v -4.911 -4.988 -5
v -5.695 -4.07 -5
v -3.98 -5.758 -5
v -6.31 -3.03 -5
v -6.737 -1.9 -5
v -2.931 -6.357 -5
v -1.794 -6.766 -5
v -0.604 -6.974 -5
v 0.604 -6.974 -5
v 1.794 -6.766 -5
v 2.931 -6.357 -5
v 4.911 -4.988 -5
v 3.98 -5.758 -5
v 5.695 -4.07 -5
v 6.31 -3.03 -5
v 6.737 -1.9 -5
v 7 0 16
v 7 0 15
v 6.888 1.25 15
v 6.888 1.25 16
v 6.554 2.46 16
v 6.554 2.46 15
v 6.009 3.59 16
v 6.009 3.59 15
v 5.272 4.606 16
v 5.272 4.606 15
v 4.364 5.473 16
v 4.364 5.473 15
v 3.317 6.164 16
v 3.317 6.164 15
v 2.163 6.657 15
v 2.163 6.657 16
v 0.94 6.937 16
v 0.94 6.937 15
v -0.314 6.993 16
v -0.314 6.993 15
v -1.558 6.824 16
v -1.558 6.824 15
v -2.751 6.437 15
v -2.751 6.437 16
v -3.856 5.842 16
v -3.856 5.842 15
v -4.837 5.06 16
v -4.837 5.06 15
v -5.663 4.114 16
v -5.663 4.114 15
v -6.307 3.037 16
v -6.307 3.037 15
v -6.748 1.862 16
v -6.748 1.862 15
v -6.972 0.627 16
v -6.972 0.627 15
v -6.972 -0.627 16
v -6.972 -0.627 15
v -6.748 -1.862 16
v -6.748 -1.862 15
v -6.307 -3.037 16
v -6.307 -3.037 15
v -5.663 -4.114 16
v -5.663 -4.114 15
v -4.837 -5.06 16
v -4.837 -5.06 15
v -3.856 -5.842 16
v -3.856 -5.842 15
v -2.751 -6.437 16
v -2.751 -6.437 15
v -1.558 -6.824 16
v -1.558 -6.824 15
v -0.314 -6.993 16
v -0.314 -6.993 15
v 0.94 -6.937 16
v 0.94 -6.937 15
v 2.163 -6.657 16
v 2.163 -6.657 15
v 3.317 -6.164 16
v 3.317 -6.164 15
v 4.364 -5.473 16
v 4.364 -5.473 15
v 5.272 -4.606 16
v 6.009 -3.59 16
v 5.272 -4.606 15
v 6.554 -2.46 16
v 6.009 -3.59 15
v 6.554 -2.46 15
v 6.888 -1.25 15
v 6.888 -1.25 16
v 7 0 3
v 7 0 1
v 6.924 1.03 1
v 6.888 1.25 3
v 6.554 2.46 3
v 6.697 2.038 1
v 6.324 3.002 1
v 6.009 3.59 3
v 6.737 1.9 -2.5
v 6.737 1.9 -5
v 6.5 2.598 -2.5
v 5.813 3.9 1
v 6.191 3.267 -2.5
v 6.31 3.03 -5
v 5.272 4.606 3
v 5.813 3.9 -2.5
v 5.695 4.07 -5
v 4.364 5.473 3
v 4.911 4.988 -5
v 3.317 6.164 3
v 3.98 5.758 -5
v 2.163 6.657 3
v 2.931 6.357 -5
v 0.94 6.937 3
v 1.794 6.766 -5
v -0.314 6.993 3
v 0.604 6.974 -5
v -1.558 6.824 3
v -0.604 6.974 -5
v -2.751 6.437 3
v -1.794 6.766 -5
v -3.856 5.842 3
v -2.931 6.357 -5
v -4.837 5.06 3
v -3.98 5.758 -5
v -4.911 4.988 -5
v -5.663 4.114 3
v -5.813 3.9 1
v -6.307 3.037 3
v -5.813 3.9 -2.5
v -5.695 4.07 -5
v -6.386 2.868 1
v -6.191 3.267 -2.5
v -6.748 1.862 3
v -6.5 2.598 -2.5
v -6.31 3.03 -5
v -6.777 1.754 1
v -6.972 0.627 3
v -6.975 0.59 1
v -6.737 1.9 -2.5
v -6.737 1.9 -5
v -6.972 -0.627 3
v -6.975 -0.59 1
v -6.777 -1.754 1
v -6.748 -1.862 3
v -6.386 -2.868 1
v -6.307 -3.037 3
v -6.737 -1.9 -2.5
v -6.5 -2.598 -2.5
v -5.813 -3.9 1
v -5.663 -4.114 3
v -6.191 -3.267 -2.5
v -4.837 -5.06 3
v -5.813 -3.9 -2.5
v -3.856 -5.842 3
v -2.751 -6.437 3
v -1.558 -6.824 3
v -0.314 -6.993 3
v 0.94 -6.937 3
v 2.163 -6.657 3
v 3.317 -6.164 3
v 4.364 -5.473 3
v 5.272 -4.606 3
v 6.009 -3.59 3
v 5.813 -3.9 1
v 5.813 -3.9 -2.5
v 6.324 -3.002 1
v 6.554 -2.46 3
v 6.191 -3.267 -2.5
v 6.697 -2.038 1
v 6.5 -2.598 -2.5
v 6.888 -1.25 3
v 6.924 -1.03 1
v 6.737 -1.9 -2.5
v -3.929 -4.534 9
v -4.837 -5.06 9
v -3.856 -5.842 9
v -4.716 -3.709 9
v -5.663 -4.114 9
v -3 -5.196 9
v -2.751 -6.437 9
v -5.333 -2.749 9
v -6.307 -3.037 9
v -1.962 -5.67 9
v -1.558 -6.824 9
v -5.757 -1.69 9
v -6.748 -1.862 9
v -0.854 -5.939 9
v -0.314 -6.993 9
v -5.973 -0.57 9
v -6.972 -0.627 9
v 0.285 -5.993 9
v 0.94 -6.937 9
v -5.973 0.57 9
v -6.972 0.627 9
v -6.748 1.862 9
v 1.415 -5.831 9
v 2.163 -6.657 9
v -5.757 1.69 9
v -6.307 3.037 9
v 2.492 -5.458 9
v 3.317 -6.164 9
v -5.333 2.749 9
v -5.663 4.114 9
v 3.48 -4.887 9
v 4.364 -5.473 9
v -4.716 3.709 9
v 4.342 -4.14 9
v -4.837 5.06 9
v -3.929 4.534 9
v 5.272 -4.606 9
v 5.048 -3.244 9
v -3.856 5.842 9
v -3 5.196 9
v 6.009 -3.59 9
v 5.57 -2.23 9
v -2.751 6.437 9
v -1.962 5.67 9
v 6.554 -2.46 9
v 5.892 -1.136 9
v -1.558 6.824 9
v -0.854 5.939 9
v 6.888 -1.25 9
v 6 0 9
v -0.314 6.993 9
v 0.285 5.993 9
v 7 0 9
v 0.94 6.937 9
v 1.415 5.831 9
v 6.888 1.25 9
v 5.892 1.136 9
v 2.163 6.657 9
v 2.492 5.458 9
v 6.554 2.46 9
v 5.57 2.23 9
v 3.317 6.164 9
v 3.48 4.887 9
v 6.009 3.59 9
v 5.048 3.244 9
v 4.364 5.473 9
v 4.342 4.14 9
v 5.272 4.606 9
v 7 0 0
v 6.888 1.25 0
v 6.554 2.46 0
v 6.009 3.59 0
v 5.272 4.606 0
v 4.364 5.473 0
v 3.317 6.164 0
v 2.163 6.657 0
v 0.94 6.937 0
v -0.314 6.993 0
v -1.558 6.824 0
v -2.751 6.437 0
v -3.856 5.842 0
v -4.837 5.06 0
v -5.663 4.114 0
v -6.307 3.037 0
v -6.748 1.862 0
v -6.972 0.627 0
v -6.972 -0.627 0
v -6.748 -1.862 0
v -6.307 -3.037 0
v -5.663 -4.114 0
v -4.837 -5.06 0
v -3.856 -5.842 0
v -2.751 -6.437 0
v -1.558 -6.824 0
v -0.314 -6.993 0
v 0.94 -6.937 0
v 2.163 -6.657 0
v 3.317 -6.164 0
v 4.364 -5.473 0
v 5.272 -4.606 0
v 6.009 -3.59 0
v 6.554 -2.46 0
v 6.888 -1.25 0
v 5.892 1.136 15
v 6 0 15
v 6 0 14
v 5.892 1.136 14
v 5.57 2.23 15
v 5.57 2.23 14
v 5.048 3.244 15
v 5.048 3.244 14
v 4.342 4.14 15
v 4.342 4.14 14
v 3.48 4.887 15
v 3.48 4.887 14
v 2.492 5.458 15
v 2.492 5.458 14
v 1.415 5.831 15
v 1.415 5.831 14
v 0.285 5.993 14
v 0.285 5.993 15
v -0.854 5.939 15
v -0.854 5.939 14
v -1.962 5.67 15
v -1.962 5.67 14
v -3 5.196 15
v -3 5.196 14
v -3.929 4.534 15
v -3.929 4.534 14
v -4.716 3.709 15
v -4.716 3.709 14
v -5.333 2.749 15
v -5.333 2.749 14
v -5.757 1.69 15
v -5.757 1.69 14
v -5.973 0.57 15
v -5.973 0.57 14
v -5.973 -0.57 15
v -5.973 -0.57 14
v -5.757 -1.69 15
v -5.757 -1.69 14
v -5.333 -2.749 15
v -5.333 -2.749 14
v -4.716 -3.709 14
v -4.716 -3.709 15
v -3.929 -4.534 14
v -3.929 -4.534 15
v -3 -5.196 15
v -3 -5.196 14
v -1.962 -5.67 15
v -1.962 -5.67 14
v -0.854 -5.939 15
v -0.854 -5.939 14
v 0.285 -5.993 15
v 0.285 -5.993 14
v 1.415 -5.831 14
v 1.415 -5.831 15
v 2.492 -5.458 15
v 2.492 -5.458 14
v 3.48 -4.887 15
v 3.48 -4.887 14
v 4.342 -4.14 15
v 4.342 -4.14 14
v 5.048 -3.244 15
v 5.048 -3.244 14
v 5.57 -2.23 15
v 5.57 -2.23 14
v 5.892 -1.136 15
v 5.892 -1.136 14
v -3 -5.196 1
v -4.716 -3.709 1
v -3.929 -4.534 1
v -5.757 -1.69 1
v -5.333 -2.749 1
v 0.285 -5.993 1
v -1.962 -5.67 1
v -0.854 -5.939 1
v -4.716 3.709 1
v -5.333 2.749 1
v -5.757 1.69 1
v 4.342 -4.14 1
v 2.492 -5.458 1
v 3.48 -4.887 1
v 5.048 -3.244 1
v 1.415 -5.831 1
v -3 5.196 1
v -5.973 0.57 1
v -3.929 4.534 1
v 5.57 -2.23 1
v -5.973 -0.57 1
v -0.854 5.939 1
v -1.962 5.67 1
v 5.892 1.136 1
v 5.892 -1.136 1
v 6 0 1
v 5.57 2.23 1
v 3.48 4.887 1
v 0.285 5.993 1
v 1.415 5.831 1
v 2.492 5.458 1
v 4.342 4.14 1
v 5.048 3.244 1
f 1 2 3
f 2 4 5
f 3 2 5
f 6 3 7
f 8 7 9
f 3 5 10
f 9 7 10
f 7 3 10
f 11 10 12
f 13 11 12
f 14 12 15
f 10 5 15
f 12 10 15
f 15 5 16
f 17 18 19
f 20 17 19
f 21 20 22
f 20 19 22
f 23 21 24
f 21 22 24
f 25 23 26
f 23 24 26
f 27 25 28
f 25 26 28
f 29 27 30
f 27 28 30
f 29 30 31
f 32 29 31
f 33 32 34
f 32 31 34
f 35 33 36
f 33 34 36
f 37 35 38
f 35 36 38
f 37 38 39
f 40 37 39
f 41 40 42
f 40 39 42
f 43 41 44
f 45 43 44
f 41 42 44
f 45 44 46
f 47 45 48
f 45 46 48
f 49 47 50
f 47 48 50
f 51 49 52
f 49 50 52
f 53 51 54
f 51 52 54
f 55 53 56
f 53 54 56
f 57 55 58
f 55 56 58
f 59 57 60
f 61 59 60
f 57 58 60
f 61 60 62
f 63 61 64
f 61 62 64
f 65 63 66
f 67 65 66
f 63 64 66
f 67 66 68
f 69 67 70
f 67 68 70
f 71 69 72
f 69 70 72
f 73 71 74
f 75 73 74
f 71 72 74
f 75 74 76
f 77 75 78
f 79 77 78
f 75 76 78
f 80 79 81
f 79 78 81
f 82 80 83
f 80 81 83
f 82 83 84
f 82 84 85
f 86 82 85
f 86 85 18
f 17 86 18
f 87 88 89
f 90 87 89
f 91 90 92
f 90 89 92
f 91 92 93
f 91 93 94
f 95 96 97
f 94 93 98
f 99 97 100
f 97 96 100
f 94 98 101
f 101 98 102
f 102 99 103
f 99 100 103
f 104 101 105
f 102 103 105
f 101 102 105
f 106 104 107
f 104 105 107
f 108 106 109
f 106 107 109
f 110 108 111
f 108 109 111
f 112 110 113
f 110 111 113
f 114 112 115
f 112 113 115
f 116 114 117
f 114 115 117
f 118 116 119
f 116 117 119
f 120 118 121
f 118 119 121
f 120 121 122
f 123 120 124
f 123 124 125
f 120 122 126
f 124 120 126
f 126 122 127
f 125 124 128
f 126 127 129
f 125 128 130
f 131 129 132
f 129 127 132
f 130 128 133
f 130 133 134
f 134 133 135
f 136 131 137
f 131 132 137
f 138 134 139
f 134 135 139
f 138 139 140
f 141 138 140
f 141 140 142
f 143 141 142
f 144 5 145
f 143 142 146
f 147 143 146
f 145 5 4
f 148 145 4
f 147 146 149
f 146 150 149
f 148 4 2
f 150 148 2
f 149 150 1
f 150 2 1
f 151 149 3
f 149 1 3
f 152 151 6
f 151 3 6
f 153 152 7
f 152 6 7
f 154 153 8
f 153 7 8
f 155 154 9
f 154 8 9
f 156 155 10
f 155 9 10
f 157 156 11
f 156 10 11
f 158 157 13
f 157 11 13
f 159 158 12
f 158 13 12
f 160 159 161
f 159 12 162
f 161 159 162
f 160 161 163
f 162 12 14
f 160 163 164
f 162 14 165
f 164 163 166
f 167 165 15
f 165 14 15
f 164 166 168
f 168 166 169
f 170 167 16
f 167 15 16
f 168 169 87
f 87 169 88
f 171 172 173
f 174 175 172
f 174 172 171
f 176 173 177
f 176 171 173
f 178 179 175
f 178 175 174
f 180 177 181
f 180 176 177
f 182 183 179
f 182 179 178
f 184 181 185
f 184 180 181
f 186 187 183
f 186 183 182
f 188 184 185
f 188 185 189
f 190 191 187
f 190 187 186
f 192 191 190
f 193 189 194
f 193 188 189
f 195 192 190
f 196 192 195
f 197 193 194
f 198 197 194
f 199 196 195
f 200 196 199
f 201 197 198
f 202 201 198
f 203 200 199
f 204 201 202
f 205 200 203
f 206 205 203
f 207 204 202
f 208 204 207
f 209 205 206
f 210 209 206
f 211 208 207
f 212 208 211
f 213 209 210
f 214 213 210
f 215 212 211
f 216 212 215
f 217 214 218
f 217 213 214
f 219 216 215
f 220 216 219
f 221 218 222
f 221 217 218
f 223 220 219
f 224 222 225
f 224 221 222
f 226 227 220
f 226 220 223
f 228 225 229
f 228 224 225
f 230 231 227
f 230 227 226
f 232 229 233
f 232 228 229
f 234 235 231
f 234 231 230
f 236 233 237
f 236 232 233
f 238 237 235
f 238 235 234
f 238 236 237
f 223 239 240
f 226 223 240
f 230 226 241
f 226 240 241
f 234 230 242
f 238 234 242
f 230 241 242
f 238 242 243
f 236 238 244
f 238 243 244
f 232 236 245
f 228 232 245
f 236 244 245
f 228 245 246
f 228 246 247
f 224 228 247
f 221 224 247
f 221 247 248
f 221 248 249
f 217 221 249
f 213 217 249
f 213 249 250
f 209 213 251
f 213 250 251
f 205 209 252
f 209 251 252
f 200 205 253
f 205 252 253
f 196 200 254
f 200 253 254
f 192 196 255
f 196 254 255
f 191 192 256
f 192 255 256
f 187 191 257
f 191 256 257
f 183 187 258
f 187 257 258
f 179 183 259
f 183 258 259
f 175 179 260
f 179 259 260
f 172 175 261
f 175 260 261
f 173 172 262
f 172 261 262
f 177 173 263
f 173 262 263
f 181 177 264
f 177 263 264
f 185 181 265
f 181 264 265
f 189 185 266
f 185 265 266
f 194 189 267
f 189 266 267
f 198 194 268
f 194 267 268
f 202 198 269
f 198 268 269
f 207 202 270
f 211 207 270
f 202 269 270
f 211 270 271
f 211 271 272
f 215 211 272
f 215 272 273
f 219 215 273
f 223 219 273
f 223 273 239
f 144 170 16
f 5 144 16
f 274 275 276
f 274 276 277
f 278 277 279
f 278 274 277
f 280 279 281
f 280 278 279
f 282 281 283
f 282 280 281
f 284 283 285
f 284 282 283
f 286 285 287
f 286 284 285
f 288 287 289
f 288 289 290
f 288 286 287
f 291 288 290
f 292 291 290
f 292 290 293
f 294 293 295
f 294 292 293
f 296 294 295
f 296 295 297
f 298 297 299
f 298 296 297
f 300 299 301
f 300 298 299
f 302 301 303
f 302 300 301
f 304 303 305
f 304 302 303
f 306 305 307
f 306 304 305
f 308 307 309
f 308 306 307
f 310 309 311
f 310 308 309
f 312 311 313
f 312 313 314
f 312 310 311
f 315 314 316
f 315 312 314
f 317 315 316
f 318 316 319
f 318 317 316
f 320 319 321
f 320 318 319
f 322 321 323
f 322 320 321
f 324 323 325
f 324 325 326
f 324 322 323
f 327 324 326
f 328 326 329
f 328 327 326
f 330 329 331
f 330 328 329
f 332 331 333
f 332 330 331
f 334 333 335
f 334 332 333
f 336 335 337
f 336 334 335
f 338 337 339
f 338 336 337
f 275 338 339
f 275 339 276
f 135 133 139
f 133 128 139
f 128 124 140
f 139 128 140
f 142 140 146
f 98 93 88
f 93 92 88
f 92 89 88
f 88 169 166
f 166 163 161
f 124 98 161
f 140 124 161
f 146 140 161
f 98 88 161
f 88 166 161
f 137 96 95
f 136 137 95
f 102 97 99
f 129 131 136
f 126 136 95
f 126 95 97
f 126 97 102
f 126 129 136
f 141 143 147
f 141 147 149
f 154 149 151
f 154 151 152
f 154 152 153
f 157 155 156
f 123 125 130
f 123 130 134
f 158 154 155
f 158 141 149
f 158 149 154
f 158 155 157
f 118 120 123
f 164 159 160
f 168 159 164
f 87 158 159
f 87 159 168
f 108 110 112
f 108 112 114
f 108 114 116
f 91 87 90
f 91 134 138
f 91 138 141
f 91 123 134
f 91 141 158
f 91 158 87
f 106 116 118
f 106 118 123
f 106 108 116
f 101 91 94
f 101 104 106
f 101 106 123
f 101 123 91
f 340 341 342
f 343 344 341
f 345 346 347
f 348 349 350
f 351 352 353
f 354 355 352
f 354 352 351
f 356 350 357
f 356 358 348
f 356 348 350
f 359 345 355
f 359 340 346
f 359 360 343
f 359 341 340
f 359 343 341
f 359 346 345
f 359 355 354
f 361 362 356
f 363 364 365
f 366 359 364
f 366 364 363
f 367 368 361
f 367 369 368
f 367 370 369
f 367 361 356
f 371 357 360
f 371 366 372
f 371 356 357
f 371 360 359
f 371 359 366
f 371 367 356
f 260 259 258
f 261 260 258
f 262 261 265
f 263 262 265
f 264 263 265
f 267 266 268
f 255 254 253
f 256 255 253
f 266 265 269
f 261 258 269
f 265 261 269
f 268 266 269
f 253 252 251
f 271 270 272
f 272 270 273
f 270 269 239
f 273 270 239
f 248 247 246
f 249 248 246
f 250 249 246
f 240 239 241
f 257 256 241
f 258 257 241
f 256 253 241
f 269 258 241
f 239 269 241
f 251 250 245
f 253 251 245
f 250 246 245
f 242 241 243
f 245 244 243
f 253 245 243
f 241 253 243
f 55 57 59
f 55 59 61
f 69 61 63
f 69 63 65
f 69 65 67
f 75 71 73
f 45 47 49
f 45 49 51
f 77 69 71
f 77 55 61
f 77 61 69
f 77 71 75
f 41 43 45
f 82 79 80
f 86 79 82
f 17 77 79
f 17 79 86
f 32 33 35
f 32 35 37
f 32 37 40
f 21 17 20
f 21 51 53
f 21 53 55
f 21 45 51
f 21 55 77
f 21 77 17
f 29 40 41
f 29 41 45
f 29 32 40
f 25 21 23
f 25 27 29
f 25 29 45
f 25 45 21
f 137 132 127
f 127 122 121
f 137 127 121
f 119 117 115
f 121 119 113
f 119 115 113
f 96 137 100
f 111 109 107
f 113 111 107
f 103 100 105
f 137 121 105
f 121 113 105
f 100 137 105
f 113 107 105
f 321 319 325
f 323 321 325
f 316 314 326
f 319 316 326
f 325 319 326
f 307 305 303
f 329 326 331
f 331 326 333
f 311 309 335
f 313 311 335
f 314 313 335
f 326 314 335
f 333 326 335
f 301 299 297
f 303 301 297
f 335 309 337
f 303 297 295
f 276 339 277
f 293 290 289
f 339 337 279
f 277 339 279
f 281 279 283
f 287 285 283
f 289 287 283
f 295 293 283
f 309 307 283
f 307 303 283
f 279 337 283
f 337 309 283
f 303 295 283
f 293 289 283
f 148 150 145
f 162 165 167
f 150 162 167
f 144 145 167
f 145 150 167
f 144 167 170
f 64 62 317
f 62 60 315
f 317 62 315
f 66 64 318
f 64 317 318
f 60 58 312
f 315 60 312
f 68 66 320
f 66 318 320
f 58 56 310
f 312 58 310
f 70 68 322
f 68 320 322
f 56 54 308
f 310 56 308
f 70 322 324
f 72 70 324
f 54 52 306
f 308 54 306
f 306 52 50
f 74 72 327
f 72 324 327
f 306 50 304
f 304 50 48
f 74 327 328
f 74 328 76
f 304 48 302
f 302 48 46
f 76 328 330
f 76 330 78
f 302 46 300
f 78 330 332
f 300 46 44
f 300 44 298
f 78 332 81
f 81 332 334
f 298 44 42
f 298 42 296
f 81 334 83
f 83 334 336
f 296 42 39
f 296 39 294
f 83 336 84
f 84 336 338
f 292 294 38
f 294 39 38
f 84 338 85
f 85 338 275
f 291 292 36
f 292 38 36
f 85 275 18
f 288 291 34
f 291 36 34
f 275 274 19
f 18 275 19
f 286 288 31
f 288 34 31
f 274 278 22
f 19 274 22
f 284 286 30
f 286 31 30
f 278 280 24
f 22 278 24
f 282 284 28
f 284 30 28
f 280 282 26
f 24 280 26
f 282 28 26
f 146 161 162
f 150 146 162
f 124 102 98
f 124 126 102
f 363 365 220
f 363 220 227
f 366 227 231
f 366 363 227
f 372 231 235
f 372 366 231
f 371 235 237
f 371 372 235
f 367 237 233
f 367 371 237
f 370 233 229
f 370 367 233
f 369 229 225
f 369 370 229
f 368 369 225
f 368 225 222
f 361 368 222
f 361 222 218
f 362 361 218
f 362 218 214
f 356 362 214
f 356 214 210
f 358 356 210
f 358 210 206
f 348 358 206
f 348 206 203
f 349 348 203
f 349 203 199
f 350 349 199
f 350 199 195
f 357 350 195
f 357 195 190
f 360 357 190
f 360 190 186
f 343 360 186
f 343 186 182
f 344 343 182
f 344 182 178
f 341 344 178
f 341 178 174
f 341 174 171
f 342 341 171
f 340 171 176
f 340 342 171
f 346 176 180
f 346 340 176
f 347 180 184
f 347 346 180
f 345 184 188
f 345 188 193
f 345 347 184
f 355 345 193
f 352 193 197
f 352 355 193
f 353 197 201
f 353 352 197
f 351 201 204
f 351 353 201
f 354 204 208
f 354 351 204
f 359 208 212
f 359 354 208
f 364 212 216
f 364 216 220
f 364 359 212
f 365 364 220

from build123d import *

# Parameters (mm, degrees)
F0_R           = 7
F1_DEPTH       = 9
F2_T           = -1
F4_R           = 6
F5_DEPTH       = 1
F4_R_2         = 7
F5_FACE_R      = 6
F6_DEPTH       = 1
F7_DEPTH       = 5
F7_DEPTH_BACK  = 3
F10_DEPTH      = 25
F10_DEPTH_BACK = 25


with BuildPart() as f1:
    # F0 (on Top) → F1 (new body)
    with BuildSketch(Plane.XY):
        Circle(F0_R)
    extrude(amount=F1_DEPTH)

    # F2
    f2_openings = [f1.faces().sort_by_distance(p)[0] for p in [
        (0, 0, 9),
    ]]
    offset(amount=F2_T, openings=f2_openings)


with BuildPart() as f5:
    # F4 (on offset) → F5 (new body)
    with BuildSketch(Plane.XY.offset(15)):
        Circle(F4_R)
    extrude(amount=-F5_DEPTH)

    # F4 (on offset) + F5_face (on face) → F6 (join)
    with BuildSketch(Plane.XY.offset(15)):
        Circle(F4_R_2)
        Circle(F4_R, mode=Mode.SUBTRACT)
    with BuildSketch(Plane.XY.offset(15)):
        Circle(F5_FACE_R)
    extrude(amount=F6_DEPTH)


with BuildPart() as f7:
    # F7 (new, two sides): a face of the model
    f7_faces = [f1.part.faces().sort_by_distance(p)[0] for p in [
        (0, 0, 0),
    ]]
    extrude(f7_faces, amount=F7_DEPTH)
    extrude(f7_faces, amount=-F7_DEPTH_BACK)

    # F9 (on Right) → F10 (cut, two sides)
    with BuildSketch(Plane.YZ) as f10_sk:
        Polygon((3.9, 1), (-3.9, 1), (-3.9, -1.5), (-3.9, -2.5), (-1.9, -2.5), (-1.9, -5), (0, -5), (1.9, -5), (1.9, -2.5), (3.9, -2.5), (3.9, -1.5), align=None)
    extrude(amount=F10_DEPTH, mode=Mode.SUBTRACT)
    extrude(f10_sk.sketch, amount=-F10_DEPTH_BACK, mode=Mode.SUBTRACT)


solid = Compound([f1.part, f5.part, f7.part])
